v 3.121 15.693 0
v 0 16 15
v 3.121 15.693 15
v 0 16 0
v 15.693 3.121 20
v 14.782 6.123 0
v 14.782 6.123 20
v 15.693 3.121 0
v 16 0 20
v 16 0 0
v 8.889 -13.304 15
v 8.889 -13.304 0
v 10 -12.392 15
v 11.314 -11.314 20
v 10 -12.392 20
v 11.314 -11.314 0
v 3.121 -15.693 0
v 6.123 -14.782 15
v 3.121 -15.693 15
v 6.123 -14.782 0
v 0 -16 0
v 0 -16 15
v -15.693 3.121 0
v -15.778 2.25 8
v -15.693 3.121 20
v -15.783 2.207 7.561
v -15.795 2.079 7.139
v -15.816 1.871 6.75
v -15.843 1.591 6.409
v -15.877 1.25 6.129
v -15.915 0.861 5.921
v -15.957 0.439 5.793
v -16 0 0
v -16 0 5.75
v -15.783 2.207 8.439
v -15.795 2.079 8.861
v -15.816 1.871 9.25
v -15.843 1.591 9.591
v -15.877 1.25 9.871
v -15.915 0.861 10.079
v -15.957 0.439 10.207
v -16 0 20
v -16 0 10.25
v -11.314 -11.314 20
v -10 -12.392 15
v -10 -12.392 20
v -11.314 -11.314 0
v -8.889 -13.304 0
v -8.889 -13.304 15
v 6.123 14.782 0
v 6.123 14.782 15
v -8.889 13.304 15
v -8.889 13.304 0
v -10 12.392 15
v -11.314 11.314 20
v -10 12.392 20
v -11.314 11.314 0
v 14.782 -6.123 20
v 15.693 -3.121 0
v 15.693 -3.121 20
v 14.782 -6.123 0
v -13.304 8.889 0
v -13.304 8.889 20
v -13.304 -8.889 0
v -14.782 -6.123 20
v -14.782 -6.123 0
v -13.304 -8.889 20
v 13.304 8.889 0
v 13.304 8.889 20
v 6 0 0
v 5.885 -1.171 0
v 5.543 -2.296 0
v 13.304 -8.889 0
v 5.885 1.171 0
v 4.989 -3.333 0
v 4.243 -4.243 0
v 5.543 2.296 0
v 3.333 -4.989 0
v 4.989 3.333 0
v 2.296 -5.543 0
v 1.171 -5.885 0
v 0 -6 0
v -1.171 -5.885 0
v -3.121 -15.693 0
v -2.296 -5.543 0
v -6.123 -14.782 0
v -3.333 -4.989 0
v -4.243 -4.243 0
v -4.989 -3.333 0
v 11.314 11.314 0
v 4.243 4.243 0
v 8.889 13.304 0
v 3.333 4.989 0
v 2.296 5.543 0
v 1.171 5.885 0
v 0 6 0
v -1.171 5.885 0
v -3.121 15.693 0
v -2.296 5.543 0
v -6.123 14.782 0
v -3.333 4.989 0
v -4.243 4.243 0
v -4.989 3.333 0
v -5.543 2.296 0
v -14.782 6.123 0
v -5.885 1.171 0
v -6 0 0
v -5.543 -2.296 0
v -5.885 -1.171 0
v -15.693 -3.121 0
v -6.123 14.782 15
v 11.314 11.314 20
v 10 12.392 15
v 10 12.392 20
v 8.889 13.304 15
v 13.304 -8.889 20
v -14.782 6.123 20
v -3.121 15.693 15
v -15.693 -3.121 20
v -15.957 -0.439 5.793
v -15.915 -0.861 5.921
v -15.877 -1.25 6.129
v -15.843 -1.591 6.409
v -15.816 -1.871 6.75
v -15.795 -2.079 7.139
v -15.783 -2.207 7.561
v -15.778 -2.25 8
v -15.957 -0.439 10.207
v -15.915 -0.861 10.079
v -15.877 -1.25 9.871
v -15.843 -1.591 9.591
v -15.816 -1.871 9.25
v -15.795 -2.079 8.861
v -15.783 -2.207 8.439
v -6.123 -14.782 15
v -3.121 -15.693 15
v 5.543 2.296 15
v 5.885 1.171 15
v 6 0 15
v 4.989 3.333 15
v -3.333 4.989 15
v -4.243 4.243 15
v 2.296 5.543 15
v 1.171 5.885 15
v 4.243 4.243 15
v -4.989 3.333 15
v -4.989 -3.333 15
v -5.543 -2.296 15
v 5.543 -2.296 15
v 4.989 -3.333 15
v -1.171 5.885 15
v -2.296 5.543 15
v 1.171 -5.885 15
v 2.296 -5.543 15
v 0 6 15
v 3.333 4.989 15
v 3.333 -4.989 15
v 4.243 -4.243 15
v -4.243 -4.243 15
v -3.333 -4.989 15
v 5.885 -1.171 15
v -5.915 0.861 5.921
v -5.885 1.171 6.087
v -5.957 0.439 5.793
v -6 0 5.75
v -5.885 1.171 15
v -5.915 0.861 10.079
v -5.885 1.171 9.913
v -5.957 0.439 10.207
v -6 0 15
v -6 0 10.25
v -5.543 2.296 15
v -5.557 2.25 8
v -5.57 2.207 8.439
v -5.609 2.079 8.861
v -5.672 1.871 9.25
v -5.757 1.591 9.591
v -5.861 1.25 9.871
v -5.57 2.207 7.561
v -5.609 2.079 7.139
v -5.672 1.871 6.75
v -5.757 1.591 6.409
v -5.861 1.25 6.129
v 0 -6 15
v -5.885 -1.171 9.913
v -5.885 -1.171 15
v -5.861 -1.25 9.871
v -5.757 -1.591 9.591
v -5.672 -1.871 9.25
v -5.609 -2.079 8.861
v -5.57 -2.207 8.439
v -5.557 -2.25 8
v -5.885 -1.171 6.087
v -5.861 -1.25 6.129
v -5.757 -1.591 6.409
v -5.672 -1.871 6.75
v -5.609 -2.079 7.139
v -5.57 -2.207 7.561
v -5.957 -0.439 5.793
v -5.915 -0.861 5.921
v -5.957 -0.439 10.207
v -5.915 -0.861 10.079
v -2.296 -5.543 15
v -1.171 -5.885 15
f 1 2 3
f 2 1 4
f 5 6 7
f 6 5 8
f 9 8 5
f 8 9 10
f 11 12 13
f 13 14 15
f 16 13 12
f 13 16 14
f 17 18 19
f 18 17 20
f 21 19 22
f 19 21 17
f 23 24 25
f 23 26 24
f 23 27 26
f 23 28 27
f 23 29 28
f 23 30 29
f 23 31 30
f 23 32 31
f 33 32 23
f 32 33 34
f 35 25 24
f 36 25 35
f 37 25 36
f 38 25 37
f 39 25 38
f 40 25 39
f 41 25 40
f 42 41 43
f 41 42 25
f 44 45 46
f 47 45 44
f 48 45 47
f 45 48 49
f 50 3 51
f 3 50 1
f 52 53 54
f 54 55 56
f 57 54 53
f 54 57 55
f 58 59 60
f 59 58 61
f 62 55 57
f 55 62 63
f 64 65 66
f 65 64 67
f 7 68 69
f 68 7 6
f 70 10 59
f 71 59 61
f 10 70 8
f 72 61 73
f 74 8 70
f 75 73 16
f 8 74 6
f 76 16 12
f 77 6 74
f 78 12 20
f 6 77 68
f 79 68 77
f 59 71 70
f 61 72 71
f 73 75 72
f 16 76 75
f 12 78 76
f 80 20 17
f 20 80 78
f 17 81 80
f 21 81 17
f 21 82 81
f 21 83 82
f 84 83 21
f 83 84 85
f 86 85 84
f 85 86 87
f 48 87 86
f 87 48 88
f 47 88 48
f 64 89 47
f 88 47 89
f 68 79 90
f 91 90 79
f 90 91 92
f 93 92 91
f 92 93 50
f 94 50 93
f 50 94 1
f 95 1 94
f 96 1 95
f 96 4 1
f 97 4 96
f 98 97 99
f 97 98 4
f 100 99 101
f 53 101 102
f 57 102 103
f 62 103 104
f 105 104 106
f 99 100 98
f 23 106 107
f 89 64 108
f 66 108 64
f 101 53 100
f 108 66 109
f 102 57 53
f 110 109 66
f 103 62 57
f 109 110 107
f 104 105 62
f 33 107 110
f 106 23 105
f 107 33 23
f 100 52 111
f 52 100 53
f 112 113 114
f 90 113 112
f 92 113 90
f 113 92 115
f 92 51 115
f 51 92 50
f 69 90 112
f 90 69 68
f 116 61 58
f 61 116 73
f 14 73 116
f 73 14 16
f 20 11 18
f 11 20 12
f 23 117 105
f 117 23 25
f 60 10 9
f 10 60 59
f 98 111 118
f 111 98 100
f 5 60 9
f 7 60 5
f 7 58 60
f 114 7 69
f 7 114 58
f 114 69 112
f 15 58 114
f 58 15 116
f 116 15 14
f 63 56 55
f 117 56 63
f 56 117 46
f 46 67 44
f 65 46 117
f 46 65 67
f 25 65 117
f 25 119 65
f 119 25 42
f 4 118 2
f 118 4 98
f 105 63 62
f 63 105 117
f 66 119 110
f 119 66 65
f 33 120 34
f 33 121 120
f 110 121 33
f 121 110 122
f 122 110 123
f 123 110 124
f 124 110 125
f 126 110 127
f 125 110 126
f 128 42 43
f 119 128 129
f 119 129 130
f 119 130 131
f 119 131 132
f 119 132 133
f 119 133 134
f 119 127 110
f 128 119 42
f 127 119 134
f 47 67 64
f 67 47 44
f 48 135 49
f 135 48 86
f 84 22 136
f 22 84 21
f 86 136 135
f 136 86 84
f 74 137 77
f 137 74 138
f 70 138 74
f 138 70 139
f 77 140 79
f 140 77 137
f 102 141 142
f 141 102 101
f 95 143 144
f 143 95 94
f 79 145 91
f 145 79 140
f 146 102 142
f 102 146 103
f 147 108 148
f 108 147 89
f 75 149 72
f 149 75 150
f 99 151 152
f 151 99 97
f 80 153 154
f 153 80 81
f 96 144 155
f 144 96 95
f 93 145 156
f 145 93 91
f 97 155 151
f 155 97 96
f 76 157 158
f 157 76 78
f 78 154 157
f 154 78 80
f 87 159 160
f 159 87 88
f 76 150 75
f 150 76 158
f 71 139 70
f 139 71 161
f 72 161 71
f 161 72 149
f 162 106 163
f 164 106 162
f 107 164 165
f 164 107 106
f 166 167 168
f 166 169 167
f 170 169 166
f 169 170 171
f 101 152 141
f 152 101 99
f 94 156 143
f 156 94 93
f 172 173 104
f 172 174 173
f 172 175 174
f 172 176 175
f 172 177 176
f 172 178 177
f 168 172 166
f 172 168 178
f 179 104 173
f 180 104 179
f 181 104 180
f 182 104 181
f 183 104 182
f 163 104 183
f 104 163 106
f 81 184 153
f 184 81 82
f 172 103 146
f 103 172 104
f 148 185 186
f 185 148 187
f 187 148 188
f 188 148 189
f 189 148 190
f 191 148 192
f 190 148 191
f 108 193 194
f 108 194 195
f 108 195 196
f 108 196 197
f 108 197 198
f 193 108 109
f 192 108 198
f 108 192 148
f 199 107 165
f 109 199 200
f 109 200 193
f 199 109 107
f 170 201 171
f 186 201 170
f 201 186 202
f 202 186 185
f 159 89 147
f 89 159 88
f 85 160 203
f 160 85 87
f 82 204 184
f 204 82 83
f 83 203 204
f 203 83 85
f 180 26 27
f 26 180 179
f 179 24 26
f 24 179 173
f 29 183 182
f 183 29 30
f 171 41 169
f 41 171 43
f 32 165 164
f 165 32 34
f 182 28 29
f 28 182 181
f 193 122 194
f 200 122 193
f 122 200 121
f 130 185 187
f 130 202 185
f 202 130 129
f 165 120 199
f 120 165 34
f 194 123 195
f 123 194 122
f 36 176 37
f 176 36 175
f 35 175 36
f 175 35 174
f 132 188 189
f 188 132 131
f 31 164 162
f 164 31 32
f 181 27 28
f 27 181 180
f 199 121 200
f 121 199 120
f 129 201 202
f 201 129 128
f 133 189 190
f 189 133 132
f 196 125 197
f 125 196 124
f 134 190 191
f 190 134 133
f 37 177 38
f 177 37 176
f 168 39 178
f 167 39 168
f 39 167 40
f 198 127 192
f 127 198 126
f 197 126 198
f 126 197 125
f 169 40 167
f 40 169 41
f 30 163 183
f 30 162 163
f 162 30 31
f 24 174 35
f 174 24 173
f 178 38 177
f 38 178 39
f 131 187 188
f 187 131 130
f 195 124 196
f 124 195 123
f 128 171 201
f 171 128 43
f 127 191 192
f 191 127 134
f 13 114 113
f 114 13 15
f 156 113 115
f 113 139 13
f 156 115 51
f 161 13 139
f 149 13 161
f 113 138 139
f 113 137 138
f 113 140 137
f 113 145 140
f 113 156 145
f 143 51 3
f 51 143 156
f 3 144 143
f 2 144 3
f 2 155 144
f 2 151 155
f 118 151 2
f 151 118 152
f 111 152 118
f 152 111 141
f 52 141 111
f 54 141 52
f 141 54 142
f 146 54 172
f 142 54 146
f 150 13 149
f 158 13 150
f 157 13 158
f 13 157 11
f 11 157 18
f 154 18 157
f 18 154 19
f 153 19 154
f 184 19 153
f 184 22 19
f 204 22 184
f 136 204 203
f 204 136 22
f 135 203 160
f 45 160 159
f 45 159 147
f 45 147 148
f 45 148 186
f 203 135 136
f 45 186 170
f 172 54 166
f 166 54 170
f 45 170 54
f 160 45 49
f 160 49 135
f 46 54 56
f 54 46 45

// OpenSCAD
$fn = 32;

// ----------------------------------------------------------------------
// Oldham coupling hub: 32 x 20 mm
// ----------------------------------------------------------------------

// --- parameters (mm) ---
hub_d = 32;               // hub diameter
hub_l = 16;               // hub length
bore_d = 12;              // shaft bore
tongue_w = 20;            // drive tongue width
tongue_h = 4;             // drive tongue height
set_d = 4.5;              // set screw tap hole

module hub() {
  /* the slot side is a raised disc with a groove milled across it */
  cylinder(h = hub_l + tongue_h, d = hub_d);
}

difference() {
  hub();
  translate([0, 0, -1]) cylinder(h = hub_l + tongue_h + 2, d = bore_d);
  translate([-hub_d / 2 - 1, 0, hub_l * 0.5])
    rotate([0, 90, 0]) cylinder(h = hub_d / 2 + 2, d = set_d);
  translate([-tongue_w / 2, -hub_d / 2 - 1, hub_l - 1])
    cube([tongue_w, hub_d + 2, tongue_h + 1]);
}
